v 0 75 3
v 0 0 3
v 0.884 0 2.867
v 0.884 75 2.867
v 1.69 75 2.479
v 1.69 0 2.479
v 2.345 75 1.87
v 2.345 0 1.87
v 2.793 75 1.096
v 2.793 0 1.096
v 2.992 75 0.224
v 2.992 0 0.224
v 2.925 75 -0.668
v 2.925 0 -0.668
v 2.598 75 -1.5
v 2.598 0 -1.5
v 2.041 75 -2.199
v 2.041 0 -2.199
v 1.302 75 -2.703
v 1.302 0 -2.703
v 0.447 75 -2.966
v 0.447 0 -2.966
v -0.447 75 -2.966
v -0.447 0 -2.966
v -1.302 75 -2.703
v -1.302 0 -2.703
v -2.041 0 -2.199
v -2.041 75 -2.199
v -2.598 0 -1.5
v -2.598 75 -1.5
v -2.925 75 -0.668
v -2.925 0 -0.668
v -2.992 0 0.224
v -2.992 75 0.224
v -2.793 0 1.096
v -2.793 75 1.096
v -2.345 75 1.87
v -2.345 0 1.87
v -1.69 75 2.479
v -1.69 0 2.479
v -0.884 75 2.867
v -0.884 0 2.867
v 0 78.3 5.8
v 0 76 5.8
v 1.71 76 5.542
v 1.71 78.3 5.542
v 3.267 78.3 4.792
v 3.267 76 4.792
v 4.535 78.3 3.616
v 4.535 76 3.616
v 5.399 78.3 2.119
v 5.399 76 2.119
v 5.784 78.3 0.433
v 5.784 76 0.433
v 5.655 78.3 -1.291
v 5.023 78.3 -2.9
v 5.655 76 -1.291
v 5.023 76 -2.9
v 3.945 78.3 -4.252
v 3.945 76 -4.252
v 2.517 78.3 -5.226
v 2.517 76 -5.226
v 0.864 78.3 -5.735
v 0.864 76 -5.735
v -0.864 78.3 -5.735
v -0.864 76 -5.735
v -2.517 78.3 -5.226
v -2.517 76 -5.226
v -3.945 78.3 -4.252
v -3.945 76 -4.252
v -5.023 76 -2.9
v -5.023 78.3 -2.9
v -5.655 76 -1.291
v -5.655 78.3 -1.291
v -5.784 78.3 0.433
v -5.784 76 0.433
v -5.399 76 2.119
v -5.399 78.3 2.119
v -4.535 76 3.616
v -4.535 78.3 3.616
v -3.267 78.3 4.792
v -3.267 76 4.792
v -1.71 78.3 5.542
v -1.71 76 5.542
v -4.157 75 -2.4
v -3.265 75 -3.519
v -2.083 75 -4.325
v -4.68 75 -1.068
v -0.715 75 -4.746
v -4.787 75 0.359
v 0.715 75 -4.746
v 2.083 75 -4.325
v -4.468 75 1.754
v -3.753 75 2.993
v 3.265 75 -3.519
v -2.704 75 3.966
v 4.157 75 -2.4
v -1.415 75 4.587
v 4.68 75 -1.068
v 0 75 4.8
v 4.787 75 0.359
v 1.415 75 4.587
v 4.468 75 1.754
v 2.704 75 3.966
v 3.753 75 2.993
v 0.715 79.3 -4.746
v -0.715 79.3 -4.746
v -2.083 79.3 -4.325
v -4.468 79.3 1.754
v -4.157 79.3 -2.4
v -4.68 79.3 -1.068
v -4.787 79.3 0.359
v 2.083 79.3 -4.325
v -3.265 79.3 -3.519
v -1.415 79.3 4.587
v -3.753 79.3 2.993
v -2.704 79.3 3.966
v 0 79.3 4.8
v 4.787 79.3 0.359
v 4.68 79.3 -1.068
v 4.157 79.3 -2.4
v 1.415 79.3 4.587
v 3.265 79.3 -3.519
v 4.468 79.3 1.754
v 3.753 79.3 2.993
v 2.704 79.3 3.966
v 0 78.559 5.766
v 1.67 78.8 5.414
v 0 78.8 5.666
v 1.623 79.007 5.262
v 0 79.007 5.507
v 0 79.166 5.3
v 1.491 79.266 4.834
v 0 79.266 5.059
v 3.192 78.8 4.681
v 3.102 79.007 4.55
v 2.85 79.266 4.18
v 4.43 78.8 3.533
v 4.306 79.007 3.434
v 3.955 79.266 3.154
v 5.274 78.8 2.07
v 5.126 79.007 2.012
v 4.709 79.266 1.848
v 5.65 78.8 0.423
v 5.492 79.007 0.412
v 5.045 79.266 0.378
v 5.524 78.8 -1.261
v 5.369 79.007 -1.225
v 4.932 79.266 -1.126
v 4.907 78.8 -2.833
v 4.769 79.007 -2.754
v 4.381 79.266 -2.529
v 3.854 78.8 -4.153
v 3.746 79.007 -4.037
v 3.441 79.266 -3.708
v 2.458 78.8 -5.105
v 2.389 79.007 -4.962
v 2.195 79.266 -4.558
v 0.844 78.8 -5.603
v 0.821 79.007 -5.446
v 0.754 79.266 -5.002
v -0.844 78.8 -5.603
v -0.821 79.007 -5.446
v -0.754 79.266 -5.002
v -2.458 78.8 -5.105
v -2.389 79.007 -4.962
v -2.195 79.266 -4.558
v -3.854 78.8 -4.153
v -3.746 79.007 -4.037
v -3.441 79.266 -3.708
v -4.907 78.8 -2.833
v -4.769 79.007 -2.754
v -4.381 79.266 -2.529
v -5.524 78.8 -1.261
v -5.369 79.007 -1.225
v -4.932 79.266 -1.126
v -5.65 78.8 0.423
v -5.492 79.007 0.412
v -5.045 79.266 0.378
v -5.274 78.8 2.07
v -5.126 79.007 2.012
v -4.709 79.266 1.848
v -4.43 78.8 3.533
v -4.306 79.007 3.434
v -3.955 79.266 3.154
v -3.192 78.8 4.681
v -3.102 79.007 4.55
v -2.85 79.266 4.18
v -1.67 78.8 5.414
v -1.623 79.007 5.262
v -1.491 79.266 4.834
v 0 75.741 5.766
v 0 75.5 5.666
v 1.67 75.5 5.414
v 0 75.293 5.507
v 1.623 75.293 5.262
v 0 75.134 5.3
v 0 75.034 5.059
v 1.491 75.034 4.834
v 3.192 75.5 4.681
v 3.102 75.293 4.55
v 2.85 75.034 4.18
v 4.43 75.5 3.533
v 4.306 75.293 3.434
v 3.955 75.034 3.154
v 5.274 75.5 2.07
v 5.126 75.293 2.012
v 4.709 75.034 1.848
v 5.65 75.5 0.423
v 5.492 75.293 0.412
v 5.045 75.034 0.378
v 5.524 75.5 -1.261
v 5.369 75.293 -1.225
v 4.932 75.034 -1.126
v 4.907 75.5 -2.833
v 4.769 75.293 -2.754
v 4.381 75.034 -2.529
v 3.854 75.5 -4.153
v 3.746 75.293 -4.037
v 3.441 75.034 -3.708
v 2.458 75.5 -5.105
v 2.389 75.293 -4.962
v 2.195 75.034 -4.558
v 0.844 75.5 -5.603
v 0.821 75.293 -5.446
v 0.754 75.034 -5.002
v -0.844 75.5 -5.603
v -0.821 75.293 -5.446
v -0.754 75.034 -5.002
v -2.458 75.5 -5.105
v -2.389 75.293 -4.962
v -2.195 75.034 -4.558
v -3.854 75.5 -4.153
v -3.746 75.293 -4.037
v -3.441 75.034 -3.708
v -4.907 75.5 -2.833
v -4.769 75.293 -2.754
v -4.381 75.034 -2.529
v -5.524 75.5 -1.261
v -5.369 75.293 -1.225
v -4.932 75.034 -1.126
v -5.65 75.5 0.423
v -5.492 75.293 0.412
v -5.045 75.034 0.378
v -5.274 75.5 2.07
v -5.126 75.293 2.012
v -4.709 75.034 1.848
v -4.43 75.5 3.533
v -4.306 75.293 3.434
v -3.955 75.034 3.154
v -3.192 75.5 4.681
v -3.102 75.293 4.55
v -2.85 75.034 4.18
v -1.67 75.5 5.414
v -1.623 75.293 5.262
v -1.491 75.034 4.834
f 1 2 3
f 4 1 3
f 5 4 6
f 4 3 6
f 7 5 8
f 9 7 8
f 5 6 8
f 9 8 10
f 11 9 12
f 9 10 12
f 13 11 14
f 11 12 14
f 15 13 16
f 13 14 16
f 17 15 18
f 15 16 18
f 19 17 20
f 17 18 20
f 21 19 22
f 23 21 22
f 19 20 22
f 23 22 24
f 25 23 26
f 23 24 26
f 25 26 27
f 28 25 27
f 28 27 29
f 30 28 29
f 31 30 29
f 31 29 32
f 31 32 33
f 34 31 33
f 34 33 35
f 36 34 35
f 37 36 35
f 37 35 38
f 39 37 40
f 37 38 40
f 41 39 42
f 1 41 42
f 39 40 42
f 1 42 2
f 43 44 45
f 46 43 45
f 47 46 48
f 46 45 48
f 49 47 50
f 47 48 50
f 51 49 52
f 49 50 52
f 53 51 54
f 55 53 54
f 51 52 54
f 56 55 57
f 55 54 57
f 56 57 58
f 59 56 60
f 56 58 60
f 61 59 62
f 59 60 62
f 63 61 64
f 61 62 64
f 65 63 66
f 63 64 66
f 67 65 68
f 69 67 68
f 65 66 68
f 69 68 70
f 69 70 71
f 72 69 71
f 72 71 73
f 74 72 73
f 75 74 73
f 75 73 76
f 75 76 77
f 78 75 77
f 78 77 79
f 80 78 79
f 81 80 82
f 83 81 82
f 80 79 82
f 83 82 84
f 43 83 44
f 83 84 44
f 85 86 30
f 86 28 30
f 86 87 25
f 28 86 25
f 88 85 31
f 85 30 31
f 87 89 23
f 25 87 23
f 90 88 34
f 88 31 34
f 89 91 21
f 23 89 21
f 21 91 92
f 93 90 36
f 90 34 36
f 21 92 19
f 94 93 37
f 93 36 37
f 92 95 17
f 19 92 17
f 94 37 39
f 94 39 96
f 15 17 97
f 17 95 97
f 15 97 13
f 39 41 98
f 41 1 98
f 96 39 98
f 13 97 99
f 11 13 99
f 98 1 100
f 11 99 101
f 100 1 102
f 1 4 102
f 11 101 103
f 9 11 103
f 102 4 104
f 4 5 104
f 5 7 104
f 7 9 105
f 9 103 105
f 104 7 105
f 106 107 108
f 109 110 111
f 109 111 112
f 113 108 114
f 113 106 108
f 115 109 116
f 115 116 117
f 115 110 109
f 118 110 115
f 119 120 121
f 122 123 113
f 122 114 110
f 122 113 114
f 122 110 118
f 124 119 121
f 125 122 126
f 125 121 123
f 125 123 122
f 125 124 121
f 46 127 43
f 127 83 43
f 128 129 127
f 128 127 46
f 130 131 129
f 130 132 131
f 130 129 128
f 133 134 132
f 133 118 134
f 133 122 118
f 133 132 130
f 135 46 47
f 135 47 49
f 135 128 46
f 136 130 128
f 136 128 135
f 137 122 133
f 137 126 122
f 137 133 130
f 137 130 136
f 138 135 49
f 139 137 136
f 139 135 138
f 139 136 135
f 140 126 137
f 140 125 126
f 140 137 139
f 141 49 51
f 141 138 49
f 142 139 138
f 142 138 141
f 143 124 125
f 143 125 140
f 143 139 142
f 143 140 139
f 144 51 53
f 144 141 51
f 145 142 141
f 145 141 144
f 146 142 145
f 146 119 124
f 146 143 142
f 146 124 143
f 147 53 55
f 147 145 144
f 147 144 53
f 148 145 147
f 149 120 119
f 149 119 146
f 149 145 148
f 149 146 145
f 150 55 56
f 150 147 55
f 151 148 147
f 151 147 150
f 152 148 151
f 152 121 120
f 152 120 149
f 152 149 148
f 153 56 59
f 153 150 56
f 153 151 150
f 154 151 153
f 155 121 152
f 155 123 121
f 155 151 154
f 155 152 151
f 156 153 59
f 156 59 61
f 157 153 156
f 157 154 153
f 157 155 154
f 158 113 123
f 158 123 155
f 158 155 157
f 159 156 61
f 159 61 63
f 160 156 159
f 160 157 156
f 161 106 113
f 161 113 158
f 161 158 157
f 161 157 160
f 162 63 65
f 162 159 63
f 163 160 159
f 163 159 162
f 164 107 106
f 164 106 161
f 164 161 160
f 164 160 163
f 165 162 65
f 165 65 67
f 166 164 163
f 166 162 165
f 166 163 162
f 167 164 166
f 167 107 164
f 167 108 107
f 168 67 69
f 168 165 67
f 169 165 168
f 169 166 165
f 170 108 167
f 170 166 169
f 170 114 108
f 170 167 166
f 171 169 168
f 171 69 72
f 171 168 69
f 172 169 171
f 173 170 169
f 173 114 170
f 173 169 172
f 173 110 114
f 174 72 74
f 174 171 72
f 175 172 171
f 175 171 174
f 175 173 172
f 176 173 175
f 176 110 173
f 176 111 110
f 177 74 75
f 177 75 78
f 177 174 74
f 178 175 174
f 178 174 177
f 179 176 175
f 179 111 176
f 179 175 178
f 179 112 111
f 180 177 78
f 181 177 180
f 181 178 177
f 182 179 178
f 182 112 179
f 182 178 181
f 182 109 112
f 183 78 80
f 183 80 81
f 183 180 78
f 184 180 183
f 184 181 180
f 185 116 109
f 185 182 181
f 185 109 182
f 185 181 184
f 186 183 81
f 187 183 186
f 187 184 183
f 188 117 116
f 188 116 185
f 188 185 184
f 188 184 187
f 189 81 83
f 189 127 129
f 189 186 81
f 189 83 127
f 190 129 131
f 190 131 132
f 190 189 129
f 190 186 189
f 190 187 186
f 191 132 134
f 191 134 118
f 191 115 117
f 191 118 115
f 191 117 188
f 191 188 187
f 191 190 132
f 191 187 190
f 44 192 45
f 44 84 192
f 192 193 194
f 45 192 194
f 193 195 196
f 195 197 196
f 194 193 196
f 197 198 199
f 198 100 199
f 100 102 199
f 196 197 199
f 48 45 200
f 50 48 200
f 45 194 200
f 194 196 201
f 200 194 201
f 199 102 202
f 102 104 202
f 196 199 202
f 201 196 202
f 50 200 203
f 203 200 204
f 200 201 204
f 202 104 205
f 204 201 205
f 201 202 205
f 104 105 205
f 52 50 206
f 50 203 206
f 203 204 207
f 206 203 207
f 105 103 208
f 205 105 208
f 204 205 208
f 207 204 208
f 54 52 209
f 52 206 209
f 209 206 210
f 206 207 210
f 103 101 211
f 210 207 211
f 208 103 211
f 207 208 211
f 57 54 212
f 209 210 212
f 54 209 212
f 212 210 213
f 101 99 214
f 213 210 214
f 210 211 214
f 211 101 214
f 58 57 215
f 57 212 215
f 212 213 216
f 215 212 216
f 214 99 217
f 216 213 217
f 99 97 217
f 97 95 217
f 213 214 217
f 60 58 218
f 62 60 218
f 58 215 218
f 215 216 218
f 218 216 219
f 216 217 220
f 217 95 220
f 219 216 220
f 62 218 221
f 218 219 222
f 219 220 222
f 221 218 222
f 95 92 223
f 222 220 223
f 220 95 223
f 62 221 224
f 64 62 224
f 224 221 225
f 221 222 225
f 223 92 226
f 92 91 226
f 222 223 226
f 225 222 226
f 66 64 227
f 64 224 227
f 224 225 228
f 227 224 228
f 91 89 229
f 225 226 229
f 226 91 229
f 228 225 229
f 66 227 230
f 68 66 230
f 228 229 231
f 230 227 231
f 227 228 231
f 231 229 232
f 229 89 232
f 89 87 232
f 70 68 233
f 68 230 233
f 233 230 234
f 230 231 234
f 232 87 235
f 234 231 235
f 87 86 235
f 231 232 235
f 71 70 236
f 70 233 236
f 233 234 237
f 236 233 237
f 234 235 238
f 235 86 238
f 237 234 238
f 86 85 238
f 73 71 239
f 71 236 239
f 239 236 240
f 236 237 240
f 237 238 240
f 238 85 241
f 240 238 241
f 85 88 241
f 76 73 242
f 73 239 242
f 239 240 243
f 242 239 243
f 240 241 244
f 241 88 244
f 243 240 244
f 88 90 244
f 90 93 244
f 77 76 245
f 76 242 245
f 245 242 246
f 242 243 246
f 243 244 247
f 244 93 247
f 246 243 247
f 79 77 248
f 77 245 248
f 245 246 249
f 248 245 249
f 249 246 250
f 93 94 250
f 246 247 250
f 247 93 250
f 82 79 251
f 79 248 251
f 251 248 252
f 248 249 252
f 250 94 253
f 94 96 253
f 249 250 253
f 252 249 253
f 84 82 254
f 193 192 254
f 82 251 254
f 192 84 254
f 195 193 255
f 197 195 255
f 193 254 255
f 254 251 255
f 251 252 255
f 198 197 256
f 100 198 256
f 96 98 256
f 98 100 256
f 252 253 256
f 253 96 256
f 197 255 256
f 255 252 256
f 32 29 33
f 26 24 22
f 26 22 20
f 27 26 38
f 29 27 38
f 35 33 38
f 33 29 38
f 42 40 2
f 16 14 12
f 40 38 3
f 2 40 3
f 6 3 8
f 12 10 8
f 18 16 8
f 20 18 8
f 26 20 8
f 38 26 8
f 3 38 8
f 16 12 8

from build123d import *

# Parameters (mm, degrees)
SKETCH1_R           = 3
BOSS_EXTRUDE1_DEPTH = 75
SKETCH2_R           = 5.8
BOSS_EXTRUDE2_DEPTH = 4.3
FILLET1_R           = 1


with BuildPart() as part:
    # Sketch1 → Boss-Extrude1 (new body)
    with BuildSketch(Plane(origin=(0, 0, 0), x_dir=(1, 0, 0), z_dir=(0, 1, 0))):
        with Locations(Location((0, 0, 0), (0, 0, 270))):  # turned: the seam where the file's is
            Circle(SKETCH1_R)
    extrude(amount=BOSS_EXTRUDE1_DEPTH)

    # Sketch2 → Boss-Extrude2 (add)
    with BuildSketch(Plane(origin=(0, 75, 0), x_dir=(1, 0, 0), z_dir=(0, 1, 0))):
        with Locations(Location((0, 0, 0), (0, 0, 270))):  # turned: the seam where the file's is
            Circle(SKETCH2_R)
    extrude(amount=BOSS_EXTRUDE2_DEPTH)

    # Fillet1
    fillet1_edges = [part.edges().sort_by_distance(p)[0] for p in [
        (0, 75, -5.8),
        (0, 79.3, -5.8),
    ]]
    fillet(fillet1_edges, radius=FILLET1_R)


solid = part.part
